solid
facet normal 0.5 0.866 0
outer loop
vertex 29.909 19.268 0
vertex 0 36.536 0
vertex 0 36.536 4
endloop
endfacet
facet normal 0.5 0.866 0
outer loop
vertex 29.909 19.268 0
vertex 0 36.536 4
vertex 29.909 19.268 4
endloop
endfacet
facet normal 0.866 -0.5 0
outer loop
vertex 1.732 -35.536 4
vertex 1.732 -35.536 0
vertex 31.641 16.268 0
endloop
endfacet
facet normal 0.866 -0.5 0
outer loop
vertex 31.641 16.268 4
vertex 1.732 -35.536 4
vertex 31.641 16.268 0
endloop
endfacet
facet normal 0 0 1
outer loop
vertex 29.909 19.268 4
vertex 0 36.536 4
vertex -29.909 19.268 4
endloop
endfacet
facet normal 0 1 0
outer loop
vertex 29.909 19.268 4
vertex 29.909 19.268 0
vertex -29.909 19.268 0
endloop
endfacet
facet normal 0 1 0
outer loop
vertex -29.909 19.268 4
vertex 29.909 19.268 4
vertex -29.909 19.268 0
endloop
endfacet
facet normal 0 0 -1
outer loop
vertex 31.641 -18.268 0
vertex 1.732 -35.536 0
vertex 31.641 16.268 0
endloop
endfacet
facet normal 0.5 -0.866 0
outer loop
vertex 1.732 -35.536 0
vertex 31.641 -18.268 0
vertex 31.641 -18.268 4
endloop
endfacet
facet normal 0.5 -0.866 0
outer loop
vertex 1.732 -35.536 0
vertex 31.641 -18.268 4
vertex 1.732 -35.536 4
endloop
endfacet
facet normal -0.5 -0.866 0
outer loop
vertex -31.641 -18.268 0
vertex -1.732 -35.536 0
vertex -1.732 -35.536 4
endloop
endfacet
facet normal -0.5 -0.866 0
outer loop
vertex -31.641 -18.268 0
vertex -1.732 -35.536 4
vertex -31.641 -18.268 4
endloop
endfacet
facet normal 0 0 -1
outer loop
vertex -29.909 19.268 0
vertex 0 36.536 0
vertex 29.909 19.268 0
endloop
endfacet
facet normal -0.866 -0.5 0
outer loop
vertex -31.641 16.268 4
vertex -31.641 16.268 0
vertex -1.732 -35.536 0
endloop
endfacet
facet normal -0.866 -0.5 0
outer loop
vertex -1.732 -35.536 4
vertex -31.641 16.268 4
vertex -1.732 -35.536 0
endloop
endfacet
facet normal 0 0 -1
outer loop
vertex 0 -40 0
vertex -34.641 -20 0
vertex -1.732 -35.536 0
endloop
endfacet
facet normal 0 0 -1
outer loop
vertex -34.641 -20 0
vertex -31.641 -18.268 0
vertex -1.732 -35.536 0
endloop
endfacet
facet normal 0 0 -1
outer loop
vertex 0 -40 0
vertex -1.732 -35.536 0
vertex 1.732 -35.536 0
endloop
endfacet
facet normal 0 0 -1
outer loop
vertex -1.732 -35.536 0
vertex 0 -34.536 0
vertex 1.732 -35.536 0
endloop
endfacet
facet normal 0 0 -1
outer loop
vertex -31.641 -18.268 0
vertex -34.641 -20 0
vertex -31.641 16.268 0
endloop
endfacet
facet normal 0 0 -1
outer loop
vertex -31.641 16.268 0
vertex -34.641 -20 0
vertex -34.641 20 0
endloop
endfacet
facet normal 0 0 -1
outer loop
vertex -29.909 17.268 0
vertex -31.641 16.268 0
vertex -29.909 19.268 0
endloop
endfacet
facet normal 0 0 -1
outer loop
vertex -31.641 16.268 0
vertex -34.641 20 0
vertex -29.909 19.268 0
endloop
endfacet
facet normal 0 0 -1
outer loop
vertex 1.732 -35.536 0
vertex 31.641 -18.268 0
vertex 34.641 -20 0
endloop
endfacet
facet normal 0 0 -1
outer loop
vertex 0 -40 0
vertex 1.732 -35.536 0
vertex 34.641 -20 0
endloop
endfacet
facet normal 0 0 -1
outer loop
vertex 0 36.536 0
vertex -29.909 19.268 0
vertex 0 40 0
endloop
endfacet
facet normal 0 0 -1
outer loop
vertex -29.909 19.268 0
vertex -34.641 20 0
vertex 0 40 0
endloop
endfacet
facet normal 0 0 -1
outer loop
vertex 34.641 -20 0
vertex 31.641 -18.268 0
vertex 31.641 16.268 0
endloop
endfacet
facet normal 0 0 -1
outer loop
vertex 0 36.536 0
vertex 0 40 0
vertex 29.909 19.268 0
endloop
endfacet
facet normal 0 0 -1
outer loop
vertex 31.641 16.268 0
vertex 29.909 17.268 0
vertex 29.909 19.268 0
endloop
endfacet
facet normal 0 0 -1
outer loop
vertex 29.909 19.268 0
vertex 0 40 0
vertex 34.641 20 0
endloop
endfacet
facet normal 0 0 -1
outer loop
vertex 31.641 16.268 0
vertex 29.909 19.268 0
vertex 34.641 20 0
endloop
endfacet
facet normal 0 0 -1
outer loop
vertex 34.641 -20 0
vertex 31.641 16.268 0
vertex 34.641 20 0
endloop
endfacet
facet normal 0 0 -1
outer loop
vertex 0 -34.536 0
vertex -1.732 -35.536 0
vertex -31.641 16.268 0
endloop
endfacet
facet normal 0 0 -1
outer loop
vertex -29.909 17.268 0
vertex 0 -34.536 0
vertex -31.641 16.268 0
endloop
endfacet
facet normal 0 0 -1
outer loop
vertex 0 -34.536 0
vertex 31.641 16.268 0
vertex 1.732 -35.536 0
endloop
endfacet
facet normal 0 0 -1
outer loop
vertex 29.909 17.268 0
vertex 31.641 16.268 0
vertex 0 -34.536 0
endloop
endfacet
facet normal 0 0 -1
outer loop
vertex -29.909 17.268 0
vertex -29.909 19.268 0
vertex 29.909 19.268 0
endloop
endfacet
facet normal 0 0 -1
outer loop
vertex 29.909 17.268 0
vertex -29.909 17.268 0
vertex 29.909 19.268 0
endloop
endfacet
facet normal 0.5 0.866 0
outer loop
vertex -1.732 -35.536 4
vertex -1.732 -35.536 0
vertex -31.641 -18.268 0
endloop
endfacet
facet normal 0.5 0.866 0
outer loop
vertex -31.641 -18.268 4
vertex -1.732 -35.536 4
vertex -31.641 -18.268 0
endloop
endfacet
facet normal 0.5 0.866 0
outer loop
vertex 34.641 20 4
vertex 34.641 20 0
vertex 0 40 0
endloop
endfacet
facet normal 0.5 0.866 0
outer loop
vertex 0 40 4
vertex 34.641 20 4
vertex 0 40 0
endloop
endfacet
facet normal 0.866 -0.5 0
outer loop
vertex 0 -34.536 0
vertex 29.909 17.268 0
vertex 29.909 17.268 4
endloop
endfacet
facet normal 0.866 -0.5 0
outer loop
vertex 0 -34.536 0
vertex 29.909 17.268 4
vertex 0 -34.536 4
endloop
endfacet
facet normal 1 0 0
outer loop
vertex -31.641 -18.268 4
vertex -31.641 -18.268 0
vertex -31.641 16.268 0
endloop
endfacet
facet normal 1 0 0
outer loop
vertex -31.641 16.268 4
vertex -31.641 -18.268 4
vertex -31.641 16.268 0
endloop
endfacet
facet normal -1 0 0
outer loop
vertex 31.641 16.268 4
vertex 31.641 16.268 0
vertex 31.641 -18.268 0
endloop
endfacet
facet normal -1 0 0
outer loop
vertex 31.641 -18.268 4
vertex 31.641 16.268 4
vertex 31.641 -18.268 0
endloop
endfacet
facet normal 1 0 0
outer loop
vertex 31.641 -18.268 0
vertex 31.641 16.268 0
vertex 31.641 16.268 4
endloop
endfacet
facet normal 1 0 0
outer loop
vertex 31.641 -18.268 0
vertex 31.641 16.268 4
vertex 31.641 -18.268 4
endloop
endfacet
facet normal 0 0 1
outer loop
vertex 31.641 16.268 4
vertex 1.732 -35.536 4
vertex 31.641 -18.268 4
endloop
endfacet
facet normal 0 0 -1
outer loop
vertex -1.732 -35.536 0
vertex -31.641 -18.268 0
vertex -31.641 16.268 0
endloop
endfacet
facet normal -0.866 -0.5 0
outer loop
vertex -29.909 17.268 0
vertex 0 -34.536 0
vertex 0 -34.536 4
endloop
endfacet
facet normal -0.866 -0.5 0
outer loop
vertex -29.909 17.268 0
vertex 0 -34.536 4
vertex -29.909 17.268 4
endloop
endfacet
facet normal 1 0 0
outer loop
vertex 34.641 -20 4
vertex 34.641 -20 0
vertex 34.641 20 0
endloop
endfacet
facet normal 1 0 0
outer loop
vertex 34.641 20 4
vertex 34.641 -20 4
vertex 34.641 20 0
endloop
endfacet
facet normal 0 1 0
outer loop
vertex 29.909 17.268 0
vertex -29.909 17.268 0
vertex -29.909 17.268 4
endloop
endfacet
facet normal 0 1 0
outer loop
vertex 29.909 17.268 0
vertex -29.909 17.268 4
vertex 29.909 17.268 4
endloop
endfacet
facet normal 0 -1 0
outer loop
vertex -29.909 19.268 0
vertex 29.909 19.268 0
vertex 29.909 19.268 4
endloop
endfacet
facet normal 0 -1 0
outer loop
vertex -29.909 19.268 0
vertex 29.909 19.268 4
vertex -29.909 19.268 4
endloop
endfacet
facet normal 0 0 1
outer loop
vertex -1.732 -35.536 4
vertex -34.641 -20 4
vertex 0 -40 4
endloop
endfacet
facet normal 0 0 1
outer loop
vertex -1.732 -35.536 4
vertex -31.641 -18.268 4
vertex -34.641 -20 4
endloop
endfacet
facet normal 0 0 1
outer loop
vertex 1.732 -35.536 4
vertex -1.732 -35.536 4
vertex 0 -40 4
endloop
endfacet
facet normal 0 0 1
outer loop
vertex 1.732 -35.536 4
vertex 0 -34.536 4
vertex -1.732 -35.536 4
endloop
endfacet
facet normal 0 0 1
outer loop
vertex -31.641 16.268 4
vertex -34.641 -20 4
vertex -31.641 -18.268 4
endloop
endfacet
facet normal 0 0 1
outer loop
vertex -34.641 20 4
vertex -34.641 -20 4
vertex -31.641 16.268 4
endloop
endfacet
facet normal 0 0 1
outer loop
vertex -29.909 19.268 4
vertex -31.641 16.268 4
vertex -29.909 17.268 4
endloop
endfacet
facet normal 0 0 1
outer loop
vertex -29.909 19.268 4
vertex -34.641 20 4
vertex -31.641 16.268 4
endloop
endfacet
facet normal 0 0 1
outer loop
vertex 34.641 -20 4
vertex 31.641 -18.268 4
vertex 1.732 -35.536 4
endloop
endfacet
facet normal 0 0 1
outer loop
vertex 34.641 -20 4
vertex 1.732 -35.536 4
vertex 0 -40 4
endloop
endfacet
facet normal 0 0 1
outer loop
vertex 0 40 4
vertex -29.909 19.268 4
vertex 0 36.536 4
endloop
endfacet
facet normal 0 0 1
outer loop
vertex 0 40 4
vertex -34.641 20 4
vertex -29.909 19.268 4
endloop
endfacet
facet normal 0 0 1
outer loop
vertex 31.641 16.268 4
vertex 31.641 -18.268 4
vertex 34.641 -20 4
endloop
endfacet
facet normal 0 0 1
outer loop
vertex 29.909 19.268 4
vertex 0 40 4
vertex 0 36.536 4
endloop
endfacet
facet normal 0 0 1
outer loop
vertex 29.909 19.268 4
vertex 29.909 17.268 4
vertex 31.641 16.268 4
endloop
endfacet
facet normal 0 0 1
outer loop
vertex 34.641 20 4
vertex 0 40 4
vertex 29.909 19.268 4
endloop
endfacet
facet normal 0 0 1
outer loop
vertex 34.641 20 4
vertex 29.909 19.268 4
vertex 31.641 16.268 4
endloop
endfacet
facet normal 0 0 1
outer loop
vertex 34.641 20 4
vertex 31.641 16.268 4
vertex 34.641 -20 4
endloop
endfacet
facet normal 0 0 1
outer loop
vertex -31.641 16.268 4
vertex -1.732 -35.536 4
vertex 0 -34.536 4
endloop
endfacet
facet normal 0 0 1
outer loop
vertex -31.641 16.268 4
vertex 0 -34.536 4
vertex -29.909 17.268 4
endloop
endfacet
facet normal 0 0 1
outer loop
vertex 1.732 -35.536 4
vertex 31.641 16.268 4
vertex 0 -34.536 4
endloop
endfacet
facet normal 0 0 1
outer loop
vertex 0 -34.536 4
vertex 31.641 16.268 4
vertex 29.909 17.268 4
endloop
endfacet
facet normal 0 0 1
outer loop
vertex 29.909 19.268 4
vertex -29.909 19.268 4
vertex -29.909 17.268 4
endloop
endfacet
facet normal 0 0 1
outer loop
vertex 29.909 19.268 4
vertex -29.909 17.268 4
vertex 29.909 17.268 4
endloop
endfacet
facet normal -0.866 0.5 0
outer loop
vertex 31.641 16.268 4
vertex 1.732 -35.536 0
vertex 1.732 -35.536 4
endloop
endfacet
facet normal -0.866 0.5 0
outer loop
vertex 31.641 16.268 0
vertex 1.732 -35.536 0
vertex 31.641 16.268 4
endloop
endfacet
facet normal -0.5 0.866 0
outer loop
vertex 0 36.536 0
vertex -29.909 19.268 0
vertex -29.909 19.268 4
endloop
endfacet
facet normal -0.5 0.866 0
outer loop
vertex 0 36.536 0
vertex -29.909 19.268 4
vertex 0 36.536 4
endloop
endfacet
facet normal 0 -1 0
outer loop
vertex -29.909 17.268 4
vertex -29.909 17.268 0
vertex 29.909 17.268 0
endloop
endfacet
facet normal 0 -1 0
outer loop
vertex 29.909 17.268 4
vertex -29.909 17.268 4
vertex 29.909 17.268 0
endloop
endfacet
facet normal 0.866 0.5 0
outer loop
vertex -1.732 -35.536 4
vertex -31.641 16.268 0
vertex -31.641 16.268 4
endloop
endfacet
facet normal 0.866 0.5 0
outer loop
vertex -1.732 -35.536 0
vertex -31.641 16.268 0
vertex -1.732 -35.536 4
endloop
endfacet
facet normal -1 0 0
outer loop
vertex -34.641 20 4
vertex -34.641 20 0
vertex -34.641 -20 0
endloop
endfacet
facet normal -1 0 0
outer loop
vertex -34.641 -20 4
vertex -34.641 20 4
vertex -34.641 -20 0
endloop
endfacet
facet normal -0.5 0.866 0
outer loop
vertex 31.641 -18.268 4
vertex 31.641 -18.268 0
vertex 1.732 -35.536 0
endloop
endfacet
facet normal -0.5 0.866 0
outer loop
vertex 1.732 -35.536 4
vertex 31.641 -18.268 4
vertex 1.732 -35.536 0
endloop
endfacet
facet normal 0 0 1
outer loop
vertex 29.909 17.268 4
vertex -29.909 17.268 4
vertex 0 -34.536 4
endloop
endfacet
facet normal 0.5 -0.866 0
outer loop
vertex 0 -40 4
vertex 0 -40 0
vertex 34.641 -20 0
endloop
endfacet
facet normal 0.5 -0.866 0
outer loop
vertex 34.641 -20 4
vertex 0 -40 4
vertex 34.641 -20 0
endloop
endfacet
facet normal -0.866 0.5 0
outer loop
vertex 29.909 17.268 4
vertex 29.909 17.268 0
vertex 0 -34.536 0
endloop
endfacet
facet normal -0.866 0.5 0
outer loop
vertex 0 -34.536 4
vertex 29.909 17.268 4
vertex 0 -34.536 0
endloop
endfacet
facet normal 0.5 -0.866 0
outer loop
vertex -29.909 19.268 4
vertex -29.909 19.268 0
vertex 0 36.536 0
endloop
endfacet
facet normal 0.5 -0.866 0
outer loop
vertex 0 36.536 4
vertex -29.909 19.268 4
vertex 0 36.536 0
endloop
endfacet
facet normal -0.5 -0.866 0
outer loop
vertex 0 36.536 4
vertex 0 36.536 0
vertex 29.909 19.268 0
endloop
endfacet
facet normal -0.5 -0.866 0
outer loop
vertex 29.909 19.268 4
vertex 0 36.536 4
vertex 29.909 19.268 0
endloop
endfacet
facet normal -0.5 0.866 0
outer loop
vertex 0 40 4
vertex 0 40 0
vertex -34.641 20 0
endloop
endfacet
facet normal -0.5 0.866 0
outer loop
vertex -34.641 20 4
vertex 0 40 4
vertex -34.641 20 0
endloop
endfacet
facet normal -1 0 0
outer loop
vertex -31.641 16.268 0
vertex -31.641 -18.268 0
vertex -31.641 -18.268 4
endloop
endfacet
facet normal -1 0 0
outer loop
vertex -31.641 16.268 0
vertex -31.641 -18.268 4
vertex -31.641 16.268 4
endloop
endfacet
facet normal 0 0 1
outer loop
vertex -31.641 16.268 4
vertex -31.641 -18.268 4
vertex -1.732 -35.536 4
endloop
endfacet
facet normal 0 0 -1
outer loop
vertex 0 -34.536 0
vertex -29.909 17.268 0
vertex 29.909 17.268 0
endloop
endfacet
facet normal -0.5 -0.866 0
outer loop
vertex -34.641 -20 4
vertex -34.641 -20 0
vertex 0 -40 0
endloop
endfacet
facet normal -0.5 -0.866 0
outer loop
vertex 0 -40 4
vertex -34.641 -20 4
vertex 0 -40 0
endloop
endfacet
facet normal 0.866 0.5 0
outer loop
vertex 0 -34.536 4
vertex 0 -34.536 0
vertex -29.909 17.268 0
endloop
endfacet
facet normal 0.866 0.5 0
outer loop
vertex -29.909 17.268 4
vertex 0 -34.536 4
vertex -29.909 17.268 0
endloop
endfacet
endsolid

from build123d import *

# Parameters (mm, degrees)
F1_DEPTH = 4
F3_DEPTH = 4.001
F4_DEPTH = 4


with BuildPart() as f1:
    # F0 (on Top) → F1 (new body)
    with BuildSketch(Plane.XY):
        Polygon((34.641016, -20), (34.641016, 20), (0, 40), (-34.641016, 20), (-34.641016, -20), (0, -40), align=None)
    extrude(amount=F1_DEPTH)

    # F2 (on Top) → F3 (cut, through all)
    with BuildSketch(Plane.XY):
        Polygon((-34.641016, -20), (0, -40), (34.641016, -20), (34.641016, 20), (0, 40), (-34.641016, 20), align=None)
        Polygon((-1.732051, -35.535898), (-31.641016, -18.267949), (-31.641016, 16.267949), align=None, mode=Mode.SUBTRACT)
        Polygon((0, -34.535898), (-29.908965, 17.267949), (29.908965, 17.267949), align=None, mode=Mode.SUBTRACT)
        Polygon((31.641016, 16.267949), (31.641016, -18.267949), (1.732051, -35.535898), align=None, mode=Mode.SUBTRACT)
        Polygon((29.908965, 19.267949), (-29.908965, 19.267949), (0, 36.535898), align=None, mode=Mode.SUBTRACT)
    extrude(amount=F3_DEPTH, mode=Mode.SUBTRACT)


with BuildPart() as f4:
    # F2 (on Top) → F4 (new body)
    with BuildSketch(Plane.XY):
        Polygon((-34.641016, -20), (0, -40), (34.641016, -20), (34.641016, 20), (0, 40), (-34.641016, 20), align=None)
        Polygon((-1.732051, -35.535898), (-31.641016, -18.267949), (-31.641016, 16.267949), align=None, mode=Mode.SUBTRACT)
        Polygon((0, -34.535898), (-29.908965, 17.267949), (29.908965, 17.267949), align=None, mode=Mode.SUBTRACT)
        Polygon((31.641016, 16.267949), (31.641016, -18.267949), (1.732051, -35.535898), align=None, mode=Mode.SUBTRACT)
        Polygon((29.908965, 19.267949), (-29.908965, 19.267949), (0, 36.535898), align=None, mode=Mode.SUBTRACT)
    extrude(amount=F4_DEPTH)


solid = Compound([f1.part, f4.part])
